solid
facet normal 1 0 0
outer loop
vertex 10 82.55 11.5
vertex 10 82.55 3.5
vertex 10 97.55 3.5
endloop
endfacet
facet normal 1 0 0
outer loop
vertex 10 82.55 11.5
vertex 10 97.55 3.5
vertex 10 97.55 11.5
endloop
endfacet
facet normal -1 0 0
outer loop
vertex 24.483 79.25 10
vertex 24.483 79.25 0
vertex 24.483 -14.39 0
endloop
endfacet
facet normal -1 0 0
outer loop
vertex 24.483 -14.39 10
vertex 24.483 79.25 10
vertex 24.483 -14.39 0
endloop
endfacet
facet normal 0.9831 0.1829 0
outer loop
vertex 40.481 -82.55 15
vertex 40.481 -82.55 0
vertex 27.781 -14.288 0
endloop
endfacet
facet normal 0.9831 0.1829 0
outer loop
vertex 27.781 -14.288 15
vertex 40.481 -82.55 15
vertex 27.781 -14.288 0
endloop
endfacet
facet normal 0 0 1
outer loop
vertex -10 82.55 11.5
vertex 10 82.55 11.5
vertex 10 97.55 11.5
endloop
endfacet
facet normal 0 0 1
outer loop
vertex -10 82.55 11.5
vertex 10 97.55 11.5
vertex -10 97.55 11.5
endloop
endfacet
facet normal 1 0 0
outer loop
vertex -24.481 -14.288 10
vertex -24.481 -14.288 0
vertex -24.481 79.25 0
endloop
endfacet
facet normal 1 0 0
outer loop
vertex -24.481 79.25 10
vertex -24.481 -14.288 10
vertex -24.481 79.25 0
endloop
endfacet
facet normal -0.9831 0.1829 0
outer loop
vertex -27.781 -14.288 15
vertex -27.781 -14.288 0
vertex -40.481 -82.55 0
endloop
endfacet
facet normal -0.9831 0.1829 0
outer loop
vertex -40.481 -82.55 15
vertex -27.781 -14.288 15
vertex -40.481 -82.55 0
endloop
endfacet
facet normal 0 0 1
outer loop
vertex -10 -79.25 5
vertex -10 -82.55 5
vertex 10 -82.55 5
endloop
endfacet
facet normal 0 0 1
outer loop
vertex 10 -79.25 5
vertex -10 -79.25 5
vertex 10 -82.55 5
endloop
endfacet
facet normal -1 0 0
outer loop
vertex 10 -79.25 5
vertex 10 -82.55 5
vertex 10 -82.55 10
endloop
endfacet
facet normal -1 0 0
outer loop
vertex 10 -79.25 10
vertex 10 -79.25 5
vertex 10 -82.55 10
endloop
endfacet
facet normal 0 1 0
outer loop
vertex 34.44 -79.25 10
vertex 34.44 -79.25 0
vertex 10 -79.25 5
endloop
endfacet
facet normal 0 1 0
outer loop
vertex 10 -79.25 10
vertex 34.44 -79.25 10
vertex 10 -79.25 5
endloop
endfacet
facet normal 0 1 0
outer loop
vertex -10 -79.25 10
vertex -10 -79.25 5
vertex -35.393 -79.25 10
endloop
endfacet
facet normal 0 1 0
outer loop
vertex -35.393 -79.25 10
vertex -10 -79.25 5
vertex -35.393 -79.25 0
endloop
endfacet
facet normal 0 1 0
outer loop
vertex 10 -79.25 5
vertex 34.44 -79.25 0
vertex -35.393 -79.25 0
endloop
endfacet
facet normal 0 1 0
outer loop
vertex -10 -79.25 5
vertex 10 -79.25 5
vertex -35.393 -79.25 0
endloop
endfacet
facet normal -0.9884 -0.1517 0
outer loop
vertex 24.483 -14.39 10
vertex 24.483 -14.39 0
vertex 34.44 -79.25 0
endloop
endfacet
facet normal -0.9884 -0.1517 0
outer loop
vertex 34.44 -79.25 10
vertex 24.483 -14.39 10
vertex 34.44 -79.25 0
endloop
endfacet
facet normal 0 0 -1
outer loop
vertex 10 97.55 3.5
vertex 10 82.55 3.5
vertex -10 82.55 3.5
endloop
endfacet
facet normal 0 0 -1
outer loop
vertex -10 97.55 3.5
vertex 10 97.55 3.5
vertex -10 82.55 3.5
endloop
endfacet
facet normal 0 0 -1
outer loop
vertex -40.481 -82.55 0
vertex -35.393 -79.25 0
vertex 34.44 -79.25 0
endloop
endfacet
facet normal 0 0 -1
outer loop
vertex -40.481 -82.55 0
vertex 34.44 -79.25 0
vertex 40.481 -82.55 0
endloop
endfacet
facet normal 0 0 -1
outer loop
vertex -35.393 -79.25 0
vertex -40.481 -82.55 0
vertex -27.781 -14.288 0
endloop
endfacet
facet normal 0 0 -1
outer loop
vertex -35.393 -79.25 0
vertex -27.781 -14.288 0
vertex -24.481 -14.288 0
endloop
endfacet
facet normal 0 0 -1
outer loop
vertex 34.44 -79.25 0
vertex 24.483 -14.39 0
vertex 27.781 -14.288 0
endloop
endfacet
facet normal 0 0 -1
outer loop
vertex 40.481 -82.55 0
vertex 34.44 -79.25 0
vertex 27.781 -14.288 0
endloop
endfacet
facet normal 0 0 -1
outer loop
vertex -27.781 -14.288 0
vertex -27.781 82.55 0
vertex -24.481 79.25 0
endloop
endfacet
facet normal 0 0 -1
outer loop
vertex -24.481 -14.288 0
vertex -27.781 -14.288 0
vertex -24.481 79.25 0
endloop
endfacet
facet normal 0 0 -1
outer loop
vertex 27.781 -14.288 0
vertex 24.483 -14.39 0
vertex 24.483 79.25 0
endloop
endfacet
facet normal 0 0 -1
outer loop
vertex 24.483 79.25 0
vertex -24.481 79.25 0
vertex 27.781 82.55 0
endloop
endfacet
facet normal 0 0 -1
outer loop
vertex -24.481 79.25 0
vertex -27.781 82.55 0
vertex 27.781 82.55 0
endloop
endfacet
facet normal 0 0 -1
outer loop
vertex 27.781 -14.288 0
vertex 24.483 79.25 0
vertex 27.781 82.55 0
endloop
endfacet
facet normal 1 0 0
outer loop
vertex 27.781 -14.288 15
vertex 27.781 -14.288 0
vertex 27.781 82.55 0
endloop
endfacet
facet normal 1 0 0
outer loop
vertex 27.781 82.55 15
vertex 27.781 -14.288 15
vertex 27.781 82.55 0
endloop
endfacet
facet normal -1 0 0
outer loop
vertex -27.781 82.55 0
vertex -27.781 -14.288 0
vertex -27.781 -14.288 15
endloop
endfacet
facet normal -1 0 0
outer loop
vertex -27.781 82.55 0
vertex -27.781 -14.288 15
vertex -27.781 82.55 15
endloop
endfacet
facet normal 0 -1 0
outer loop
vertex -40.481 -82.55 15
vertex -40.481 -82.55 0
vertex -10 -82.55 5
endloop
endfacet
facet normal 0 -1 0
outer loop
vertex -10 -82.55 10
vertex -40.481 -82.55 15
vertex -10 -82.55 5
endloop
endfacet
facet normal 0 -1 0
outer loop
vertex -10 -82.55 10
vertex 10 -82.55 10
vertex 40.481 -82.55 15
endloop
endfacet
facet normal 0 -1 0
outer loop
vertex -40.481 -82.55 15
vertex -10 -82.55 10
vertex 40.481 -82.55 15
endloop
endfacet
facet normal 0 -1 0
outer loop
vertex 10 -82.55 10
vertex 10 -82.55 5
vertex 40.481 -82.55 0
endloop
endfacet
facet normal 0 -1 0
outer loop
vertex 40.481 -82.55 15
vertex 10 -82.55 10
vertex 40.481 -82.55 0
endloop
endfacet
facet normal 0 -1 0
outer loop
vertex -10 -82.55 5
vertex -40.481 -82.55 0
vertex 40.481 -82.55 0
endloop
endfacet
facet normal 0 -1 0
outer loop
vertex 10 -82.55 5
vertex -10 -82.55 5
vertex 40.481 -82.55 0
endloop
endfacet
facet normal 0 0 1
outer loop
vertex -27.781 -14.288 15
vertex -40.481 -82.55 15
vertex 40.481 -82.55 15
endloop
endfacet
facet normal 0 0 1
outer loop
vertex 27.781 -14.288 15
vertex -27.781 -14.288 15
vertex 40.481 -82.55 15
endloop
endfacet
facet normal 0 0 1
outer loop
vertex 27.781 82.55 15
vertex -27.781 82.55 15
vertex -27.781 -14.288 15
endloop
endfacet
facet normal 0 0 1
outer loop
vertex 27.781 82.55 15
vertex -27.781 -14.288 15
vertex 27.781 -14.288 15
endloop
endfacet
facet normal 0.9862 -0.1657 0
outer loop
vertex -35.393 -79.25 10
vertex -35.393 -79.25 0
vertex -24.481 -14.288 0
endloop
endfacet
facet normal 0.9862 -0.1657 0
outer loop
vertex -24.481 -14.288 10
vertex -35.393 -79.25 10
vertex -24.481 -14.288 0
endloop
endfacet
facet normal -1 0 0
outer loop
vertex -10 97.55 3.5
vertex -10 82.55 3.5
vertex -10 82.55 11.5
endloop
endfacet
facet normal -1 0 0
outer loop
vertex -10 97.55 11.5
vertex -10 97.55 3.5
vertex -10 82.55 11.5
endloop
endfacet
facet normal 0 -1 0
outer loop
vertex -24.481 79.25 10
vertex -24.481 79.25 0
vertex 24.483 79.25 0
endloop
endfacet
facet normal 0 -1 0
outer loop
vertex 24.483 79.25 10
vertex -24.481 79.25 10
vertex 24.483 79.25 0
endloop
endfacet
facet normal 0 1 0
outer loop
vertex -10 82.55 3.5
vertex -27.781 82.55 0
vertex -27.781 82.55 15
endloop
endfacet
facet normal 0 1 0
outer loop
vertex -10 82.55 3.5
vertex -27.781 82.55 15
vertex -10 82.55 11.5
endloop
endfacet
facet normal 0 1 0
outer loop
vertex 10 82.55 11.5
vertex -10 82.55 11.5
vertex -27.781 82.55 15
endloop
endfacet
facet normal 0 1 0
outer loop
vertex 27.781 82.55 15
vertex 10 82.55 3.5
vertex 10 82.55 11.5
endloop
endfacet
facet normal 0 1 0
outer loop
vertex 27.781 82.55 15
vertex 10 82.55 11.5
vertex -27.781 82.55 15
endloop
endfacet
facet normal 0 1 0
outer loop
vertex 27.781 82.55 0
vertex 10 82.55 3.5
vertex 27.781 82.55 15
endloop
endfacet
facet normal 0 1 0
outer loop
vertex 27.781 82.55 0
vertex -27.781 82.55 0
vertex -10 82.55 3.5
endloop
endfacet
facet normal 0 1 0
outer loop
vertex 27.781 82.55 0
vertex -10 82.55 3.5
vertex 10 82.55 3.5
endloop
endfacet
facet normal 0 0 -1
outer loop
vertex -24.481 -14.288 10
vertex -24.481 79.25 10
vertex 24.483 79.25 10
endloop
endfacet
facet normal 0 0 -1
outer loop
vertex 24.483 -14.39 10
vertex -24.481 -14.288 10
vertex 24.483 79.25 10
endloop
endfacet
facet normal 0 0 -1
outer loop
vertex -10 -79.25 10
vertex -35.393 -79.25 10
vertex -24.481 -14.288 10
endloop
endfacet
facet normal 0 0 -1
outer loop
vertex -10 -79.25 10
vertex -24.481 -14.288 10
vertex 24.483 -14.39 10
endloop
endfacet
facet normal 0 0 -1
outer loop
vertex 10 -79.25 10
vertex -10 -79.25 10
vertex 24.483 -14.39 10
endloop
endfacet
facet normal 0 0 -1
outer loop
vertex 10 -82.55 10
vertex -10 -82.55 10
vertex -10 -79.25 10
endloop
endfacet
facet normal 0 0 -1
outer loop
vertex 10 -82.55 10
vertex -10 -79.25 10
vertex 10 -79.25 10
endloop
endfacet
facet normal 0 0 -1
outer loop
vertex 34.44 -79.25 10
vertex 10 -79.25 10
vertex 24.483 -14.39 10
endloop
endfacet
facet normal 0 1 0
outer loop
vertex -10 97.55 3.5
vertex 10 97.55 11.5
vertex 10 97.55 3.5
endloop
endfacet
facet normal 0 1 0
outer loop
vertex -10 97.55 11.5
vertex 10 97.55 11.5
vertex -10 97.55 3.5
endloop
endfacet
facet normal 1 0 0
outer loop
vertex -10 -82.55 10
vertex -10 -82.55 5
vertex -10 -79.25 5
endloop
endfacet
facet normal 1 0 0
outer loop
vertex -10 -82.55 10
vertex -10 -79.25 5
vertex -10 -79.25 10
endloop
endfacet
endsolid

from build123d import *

# Parameters (mm, degrees)
F0_W     = 55.5625
F0_H     = 68.2625
F0_H_2   = 96.8375
F1_DEPTH = 15
F3_DEPTH = 10
F4_W     = 20
F4_H     = 5
F5_DEPTH = 25
F6_W     = 20
F6_H     = 8
F7_DEPTH = 15


with BuildPart() as f1:
    # F0 (on Top) → F1 (new body)
    with BuildSketch(Plane.XY):
        with Locations((0, -48.41875)):
            Rectangle(F0_W, F0_H)
        Polygon((27.78125, -14.2875), (27.78125, -82.55), (40.48125, -82.55), align=None)
        Polygon((-40.48125, -82.55), (-27.78125, -82.55), (-27.78125, -14.2875), align=None)
        with Locations((0, 34.13125)):
            Rectangle(F0_W, F0_H_2)
    extrude(amount=F1_DEPTH)

    # F2 (on face) → F3 (cut)
    with BuildSketch(Plane(origin=(0, 0, 0), x_dir=(1, 0, 0), z_dir=(0, 0, -1))):
        Polygon((34.4403, 79.25), (-35.392648, 79.25), (-24.48125, 14.2875), (-24.48125, -79.25), (24.482846, -79.25), (24.482846, 14.390121), align=None)
    extrude(amount=-F3_DEPTH, mode=Mode.SUBTRACT)

    # F4 (on face) → F5 (cut)
    with BuildSketch(Plane.XZ.offset(82.55)):
        with Locations((0, 7.5)):
            Rectangle(F4_W, F4_H)
    extrude(amount=-F5_DEPTH, mode=Mode.SUBTRACT)

    # F6 (on face) → F7 (join)
    with BuildSketch(Plane(origin=(0, 82.55, 0), x_dir=(-1, 0, 0), z_dir=(0, 1, 0))):
        with Locations((0, 7.5)):
            Rectangle(F6_W, F6_H)
    extrude(amount=F7_DEPTH)


solid = f1.part
